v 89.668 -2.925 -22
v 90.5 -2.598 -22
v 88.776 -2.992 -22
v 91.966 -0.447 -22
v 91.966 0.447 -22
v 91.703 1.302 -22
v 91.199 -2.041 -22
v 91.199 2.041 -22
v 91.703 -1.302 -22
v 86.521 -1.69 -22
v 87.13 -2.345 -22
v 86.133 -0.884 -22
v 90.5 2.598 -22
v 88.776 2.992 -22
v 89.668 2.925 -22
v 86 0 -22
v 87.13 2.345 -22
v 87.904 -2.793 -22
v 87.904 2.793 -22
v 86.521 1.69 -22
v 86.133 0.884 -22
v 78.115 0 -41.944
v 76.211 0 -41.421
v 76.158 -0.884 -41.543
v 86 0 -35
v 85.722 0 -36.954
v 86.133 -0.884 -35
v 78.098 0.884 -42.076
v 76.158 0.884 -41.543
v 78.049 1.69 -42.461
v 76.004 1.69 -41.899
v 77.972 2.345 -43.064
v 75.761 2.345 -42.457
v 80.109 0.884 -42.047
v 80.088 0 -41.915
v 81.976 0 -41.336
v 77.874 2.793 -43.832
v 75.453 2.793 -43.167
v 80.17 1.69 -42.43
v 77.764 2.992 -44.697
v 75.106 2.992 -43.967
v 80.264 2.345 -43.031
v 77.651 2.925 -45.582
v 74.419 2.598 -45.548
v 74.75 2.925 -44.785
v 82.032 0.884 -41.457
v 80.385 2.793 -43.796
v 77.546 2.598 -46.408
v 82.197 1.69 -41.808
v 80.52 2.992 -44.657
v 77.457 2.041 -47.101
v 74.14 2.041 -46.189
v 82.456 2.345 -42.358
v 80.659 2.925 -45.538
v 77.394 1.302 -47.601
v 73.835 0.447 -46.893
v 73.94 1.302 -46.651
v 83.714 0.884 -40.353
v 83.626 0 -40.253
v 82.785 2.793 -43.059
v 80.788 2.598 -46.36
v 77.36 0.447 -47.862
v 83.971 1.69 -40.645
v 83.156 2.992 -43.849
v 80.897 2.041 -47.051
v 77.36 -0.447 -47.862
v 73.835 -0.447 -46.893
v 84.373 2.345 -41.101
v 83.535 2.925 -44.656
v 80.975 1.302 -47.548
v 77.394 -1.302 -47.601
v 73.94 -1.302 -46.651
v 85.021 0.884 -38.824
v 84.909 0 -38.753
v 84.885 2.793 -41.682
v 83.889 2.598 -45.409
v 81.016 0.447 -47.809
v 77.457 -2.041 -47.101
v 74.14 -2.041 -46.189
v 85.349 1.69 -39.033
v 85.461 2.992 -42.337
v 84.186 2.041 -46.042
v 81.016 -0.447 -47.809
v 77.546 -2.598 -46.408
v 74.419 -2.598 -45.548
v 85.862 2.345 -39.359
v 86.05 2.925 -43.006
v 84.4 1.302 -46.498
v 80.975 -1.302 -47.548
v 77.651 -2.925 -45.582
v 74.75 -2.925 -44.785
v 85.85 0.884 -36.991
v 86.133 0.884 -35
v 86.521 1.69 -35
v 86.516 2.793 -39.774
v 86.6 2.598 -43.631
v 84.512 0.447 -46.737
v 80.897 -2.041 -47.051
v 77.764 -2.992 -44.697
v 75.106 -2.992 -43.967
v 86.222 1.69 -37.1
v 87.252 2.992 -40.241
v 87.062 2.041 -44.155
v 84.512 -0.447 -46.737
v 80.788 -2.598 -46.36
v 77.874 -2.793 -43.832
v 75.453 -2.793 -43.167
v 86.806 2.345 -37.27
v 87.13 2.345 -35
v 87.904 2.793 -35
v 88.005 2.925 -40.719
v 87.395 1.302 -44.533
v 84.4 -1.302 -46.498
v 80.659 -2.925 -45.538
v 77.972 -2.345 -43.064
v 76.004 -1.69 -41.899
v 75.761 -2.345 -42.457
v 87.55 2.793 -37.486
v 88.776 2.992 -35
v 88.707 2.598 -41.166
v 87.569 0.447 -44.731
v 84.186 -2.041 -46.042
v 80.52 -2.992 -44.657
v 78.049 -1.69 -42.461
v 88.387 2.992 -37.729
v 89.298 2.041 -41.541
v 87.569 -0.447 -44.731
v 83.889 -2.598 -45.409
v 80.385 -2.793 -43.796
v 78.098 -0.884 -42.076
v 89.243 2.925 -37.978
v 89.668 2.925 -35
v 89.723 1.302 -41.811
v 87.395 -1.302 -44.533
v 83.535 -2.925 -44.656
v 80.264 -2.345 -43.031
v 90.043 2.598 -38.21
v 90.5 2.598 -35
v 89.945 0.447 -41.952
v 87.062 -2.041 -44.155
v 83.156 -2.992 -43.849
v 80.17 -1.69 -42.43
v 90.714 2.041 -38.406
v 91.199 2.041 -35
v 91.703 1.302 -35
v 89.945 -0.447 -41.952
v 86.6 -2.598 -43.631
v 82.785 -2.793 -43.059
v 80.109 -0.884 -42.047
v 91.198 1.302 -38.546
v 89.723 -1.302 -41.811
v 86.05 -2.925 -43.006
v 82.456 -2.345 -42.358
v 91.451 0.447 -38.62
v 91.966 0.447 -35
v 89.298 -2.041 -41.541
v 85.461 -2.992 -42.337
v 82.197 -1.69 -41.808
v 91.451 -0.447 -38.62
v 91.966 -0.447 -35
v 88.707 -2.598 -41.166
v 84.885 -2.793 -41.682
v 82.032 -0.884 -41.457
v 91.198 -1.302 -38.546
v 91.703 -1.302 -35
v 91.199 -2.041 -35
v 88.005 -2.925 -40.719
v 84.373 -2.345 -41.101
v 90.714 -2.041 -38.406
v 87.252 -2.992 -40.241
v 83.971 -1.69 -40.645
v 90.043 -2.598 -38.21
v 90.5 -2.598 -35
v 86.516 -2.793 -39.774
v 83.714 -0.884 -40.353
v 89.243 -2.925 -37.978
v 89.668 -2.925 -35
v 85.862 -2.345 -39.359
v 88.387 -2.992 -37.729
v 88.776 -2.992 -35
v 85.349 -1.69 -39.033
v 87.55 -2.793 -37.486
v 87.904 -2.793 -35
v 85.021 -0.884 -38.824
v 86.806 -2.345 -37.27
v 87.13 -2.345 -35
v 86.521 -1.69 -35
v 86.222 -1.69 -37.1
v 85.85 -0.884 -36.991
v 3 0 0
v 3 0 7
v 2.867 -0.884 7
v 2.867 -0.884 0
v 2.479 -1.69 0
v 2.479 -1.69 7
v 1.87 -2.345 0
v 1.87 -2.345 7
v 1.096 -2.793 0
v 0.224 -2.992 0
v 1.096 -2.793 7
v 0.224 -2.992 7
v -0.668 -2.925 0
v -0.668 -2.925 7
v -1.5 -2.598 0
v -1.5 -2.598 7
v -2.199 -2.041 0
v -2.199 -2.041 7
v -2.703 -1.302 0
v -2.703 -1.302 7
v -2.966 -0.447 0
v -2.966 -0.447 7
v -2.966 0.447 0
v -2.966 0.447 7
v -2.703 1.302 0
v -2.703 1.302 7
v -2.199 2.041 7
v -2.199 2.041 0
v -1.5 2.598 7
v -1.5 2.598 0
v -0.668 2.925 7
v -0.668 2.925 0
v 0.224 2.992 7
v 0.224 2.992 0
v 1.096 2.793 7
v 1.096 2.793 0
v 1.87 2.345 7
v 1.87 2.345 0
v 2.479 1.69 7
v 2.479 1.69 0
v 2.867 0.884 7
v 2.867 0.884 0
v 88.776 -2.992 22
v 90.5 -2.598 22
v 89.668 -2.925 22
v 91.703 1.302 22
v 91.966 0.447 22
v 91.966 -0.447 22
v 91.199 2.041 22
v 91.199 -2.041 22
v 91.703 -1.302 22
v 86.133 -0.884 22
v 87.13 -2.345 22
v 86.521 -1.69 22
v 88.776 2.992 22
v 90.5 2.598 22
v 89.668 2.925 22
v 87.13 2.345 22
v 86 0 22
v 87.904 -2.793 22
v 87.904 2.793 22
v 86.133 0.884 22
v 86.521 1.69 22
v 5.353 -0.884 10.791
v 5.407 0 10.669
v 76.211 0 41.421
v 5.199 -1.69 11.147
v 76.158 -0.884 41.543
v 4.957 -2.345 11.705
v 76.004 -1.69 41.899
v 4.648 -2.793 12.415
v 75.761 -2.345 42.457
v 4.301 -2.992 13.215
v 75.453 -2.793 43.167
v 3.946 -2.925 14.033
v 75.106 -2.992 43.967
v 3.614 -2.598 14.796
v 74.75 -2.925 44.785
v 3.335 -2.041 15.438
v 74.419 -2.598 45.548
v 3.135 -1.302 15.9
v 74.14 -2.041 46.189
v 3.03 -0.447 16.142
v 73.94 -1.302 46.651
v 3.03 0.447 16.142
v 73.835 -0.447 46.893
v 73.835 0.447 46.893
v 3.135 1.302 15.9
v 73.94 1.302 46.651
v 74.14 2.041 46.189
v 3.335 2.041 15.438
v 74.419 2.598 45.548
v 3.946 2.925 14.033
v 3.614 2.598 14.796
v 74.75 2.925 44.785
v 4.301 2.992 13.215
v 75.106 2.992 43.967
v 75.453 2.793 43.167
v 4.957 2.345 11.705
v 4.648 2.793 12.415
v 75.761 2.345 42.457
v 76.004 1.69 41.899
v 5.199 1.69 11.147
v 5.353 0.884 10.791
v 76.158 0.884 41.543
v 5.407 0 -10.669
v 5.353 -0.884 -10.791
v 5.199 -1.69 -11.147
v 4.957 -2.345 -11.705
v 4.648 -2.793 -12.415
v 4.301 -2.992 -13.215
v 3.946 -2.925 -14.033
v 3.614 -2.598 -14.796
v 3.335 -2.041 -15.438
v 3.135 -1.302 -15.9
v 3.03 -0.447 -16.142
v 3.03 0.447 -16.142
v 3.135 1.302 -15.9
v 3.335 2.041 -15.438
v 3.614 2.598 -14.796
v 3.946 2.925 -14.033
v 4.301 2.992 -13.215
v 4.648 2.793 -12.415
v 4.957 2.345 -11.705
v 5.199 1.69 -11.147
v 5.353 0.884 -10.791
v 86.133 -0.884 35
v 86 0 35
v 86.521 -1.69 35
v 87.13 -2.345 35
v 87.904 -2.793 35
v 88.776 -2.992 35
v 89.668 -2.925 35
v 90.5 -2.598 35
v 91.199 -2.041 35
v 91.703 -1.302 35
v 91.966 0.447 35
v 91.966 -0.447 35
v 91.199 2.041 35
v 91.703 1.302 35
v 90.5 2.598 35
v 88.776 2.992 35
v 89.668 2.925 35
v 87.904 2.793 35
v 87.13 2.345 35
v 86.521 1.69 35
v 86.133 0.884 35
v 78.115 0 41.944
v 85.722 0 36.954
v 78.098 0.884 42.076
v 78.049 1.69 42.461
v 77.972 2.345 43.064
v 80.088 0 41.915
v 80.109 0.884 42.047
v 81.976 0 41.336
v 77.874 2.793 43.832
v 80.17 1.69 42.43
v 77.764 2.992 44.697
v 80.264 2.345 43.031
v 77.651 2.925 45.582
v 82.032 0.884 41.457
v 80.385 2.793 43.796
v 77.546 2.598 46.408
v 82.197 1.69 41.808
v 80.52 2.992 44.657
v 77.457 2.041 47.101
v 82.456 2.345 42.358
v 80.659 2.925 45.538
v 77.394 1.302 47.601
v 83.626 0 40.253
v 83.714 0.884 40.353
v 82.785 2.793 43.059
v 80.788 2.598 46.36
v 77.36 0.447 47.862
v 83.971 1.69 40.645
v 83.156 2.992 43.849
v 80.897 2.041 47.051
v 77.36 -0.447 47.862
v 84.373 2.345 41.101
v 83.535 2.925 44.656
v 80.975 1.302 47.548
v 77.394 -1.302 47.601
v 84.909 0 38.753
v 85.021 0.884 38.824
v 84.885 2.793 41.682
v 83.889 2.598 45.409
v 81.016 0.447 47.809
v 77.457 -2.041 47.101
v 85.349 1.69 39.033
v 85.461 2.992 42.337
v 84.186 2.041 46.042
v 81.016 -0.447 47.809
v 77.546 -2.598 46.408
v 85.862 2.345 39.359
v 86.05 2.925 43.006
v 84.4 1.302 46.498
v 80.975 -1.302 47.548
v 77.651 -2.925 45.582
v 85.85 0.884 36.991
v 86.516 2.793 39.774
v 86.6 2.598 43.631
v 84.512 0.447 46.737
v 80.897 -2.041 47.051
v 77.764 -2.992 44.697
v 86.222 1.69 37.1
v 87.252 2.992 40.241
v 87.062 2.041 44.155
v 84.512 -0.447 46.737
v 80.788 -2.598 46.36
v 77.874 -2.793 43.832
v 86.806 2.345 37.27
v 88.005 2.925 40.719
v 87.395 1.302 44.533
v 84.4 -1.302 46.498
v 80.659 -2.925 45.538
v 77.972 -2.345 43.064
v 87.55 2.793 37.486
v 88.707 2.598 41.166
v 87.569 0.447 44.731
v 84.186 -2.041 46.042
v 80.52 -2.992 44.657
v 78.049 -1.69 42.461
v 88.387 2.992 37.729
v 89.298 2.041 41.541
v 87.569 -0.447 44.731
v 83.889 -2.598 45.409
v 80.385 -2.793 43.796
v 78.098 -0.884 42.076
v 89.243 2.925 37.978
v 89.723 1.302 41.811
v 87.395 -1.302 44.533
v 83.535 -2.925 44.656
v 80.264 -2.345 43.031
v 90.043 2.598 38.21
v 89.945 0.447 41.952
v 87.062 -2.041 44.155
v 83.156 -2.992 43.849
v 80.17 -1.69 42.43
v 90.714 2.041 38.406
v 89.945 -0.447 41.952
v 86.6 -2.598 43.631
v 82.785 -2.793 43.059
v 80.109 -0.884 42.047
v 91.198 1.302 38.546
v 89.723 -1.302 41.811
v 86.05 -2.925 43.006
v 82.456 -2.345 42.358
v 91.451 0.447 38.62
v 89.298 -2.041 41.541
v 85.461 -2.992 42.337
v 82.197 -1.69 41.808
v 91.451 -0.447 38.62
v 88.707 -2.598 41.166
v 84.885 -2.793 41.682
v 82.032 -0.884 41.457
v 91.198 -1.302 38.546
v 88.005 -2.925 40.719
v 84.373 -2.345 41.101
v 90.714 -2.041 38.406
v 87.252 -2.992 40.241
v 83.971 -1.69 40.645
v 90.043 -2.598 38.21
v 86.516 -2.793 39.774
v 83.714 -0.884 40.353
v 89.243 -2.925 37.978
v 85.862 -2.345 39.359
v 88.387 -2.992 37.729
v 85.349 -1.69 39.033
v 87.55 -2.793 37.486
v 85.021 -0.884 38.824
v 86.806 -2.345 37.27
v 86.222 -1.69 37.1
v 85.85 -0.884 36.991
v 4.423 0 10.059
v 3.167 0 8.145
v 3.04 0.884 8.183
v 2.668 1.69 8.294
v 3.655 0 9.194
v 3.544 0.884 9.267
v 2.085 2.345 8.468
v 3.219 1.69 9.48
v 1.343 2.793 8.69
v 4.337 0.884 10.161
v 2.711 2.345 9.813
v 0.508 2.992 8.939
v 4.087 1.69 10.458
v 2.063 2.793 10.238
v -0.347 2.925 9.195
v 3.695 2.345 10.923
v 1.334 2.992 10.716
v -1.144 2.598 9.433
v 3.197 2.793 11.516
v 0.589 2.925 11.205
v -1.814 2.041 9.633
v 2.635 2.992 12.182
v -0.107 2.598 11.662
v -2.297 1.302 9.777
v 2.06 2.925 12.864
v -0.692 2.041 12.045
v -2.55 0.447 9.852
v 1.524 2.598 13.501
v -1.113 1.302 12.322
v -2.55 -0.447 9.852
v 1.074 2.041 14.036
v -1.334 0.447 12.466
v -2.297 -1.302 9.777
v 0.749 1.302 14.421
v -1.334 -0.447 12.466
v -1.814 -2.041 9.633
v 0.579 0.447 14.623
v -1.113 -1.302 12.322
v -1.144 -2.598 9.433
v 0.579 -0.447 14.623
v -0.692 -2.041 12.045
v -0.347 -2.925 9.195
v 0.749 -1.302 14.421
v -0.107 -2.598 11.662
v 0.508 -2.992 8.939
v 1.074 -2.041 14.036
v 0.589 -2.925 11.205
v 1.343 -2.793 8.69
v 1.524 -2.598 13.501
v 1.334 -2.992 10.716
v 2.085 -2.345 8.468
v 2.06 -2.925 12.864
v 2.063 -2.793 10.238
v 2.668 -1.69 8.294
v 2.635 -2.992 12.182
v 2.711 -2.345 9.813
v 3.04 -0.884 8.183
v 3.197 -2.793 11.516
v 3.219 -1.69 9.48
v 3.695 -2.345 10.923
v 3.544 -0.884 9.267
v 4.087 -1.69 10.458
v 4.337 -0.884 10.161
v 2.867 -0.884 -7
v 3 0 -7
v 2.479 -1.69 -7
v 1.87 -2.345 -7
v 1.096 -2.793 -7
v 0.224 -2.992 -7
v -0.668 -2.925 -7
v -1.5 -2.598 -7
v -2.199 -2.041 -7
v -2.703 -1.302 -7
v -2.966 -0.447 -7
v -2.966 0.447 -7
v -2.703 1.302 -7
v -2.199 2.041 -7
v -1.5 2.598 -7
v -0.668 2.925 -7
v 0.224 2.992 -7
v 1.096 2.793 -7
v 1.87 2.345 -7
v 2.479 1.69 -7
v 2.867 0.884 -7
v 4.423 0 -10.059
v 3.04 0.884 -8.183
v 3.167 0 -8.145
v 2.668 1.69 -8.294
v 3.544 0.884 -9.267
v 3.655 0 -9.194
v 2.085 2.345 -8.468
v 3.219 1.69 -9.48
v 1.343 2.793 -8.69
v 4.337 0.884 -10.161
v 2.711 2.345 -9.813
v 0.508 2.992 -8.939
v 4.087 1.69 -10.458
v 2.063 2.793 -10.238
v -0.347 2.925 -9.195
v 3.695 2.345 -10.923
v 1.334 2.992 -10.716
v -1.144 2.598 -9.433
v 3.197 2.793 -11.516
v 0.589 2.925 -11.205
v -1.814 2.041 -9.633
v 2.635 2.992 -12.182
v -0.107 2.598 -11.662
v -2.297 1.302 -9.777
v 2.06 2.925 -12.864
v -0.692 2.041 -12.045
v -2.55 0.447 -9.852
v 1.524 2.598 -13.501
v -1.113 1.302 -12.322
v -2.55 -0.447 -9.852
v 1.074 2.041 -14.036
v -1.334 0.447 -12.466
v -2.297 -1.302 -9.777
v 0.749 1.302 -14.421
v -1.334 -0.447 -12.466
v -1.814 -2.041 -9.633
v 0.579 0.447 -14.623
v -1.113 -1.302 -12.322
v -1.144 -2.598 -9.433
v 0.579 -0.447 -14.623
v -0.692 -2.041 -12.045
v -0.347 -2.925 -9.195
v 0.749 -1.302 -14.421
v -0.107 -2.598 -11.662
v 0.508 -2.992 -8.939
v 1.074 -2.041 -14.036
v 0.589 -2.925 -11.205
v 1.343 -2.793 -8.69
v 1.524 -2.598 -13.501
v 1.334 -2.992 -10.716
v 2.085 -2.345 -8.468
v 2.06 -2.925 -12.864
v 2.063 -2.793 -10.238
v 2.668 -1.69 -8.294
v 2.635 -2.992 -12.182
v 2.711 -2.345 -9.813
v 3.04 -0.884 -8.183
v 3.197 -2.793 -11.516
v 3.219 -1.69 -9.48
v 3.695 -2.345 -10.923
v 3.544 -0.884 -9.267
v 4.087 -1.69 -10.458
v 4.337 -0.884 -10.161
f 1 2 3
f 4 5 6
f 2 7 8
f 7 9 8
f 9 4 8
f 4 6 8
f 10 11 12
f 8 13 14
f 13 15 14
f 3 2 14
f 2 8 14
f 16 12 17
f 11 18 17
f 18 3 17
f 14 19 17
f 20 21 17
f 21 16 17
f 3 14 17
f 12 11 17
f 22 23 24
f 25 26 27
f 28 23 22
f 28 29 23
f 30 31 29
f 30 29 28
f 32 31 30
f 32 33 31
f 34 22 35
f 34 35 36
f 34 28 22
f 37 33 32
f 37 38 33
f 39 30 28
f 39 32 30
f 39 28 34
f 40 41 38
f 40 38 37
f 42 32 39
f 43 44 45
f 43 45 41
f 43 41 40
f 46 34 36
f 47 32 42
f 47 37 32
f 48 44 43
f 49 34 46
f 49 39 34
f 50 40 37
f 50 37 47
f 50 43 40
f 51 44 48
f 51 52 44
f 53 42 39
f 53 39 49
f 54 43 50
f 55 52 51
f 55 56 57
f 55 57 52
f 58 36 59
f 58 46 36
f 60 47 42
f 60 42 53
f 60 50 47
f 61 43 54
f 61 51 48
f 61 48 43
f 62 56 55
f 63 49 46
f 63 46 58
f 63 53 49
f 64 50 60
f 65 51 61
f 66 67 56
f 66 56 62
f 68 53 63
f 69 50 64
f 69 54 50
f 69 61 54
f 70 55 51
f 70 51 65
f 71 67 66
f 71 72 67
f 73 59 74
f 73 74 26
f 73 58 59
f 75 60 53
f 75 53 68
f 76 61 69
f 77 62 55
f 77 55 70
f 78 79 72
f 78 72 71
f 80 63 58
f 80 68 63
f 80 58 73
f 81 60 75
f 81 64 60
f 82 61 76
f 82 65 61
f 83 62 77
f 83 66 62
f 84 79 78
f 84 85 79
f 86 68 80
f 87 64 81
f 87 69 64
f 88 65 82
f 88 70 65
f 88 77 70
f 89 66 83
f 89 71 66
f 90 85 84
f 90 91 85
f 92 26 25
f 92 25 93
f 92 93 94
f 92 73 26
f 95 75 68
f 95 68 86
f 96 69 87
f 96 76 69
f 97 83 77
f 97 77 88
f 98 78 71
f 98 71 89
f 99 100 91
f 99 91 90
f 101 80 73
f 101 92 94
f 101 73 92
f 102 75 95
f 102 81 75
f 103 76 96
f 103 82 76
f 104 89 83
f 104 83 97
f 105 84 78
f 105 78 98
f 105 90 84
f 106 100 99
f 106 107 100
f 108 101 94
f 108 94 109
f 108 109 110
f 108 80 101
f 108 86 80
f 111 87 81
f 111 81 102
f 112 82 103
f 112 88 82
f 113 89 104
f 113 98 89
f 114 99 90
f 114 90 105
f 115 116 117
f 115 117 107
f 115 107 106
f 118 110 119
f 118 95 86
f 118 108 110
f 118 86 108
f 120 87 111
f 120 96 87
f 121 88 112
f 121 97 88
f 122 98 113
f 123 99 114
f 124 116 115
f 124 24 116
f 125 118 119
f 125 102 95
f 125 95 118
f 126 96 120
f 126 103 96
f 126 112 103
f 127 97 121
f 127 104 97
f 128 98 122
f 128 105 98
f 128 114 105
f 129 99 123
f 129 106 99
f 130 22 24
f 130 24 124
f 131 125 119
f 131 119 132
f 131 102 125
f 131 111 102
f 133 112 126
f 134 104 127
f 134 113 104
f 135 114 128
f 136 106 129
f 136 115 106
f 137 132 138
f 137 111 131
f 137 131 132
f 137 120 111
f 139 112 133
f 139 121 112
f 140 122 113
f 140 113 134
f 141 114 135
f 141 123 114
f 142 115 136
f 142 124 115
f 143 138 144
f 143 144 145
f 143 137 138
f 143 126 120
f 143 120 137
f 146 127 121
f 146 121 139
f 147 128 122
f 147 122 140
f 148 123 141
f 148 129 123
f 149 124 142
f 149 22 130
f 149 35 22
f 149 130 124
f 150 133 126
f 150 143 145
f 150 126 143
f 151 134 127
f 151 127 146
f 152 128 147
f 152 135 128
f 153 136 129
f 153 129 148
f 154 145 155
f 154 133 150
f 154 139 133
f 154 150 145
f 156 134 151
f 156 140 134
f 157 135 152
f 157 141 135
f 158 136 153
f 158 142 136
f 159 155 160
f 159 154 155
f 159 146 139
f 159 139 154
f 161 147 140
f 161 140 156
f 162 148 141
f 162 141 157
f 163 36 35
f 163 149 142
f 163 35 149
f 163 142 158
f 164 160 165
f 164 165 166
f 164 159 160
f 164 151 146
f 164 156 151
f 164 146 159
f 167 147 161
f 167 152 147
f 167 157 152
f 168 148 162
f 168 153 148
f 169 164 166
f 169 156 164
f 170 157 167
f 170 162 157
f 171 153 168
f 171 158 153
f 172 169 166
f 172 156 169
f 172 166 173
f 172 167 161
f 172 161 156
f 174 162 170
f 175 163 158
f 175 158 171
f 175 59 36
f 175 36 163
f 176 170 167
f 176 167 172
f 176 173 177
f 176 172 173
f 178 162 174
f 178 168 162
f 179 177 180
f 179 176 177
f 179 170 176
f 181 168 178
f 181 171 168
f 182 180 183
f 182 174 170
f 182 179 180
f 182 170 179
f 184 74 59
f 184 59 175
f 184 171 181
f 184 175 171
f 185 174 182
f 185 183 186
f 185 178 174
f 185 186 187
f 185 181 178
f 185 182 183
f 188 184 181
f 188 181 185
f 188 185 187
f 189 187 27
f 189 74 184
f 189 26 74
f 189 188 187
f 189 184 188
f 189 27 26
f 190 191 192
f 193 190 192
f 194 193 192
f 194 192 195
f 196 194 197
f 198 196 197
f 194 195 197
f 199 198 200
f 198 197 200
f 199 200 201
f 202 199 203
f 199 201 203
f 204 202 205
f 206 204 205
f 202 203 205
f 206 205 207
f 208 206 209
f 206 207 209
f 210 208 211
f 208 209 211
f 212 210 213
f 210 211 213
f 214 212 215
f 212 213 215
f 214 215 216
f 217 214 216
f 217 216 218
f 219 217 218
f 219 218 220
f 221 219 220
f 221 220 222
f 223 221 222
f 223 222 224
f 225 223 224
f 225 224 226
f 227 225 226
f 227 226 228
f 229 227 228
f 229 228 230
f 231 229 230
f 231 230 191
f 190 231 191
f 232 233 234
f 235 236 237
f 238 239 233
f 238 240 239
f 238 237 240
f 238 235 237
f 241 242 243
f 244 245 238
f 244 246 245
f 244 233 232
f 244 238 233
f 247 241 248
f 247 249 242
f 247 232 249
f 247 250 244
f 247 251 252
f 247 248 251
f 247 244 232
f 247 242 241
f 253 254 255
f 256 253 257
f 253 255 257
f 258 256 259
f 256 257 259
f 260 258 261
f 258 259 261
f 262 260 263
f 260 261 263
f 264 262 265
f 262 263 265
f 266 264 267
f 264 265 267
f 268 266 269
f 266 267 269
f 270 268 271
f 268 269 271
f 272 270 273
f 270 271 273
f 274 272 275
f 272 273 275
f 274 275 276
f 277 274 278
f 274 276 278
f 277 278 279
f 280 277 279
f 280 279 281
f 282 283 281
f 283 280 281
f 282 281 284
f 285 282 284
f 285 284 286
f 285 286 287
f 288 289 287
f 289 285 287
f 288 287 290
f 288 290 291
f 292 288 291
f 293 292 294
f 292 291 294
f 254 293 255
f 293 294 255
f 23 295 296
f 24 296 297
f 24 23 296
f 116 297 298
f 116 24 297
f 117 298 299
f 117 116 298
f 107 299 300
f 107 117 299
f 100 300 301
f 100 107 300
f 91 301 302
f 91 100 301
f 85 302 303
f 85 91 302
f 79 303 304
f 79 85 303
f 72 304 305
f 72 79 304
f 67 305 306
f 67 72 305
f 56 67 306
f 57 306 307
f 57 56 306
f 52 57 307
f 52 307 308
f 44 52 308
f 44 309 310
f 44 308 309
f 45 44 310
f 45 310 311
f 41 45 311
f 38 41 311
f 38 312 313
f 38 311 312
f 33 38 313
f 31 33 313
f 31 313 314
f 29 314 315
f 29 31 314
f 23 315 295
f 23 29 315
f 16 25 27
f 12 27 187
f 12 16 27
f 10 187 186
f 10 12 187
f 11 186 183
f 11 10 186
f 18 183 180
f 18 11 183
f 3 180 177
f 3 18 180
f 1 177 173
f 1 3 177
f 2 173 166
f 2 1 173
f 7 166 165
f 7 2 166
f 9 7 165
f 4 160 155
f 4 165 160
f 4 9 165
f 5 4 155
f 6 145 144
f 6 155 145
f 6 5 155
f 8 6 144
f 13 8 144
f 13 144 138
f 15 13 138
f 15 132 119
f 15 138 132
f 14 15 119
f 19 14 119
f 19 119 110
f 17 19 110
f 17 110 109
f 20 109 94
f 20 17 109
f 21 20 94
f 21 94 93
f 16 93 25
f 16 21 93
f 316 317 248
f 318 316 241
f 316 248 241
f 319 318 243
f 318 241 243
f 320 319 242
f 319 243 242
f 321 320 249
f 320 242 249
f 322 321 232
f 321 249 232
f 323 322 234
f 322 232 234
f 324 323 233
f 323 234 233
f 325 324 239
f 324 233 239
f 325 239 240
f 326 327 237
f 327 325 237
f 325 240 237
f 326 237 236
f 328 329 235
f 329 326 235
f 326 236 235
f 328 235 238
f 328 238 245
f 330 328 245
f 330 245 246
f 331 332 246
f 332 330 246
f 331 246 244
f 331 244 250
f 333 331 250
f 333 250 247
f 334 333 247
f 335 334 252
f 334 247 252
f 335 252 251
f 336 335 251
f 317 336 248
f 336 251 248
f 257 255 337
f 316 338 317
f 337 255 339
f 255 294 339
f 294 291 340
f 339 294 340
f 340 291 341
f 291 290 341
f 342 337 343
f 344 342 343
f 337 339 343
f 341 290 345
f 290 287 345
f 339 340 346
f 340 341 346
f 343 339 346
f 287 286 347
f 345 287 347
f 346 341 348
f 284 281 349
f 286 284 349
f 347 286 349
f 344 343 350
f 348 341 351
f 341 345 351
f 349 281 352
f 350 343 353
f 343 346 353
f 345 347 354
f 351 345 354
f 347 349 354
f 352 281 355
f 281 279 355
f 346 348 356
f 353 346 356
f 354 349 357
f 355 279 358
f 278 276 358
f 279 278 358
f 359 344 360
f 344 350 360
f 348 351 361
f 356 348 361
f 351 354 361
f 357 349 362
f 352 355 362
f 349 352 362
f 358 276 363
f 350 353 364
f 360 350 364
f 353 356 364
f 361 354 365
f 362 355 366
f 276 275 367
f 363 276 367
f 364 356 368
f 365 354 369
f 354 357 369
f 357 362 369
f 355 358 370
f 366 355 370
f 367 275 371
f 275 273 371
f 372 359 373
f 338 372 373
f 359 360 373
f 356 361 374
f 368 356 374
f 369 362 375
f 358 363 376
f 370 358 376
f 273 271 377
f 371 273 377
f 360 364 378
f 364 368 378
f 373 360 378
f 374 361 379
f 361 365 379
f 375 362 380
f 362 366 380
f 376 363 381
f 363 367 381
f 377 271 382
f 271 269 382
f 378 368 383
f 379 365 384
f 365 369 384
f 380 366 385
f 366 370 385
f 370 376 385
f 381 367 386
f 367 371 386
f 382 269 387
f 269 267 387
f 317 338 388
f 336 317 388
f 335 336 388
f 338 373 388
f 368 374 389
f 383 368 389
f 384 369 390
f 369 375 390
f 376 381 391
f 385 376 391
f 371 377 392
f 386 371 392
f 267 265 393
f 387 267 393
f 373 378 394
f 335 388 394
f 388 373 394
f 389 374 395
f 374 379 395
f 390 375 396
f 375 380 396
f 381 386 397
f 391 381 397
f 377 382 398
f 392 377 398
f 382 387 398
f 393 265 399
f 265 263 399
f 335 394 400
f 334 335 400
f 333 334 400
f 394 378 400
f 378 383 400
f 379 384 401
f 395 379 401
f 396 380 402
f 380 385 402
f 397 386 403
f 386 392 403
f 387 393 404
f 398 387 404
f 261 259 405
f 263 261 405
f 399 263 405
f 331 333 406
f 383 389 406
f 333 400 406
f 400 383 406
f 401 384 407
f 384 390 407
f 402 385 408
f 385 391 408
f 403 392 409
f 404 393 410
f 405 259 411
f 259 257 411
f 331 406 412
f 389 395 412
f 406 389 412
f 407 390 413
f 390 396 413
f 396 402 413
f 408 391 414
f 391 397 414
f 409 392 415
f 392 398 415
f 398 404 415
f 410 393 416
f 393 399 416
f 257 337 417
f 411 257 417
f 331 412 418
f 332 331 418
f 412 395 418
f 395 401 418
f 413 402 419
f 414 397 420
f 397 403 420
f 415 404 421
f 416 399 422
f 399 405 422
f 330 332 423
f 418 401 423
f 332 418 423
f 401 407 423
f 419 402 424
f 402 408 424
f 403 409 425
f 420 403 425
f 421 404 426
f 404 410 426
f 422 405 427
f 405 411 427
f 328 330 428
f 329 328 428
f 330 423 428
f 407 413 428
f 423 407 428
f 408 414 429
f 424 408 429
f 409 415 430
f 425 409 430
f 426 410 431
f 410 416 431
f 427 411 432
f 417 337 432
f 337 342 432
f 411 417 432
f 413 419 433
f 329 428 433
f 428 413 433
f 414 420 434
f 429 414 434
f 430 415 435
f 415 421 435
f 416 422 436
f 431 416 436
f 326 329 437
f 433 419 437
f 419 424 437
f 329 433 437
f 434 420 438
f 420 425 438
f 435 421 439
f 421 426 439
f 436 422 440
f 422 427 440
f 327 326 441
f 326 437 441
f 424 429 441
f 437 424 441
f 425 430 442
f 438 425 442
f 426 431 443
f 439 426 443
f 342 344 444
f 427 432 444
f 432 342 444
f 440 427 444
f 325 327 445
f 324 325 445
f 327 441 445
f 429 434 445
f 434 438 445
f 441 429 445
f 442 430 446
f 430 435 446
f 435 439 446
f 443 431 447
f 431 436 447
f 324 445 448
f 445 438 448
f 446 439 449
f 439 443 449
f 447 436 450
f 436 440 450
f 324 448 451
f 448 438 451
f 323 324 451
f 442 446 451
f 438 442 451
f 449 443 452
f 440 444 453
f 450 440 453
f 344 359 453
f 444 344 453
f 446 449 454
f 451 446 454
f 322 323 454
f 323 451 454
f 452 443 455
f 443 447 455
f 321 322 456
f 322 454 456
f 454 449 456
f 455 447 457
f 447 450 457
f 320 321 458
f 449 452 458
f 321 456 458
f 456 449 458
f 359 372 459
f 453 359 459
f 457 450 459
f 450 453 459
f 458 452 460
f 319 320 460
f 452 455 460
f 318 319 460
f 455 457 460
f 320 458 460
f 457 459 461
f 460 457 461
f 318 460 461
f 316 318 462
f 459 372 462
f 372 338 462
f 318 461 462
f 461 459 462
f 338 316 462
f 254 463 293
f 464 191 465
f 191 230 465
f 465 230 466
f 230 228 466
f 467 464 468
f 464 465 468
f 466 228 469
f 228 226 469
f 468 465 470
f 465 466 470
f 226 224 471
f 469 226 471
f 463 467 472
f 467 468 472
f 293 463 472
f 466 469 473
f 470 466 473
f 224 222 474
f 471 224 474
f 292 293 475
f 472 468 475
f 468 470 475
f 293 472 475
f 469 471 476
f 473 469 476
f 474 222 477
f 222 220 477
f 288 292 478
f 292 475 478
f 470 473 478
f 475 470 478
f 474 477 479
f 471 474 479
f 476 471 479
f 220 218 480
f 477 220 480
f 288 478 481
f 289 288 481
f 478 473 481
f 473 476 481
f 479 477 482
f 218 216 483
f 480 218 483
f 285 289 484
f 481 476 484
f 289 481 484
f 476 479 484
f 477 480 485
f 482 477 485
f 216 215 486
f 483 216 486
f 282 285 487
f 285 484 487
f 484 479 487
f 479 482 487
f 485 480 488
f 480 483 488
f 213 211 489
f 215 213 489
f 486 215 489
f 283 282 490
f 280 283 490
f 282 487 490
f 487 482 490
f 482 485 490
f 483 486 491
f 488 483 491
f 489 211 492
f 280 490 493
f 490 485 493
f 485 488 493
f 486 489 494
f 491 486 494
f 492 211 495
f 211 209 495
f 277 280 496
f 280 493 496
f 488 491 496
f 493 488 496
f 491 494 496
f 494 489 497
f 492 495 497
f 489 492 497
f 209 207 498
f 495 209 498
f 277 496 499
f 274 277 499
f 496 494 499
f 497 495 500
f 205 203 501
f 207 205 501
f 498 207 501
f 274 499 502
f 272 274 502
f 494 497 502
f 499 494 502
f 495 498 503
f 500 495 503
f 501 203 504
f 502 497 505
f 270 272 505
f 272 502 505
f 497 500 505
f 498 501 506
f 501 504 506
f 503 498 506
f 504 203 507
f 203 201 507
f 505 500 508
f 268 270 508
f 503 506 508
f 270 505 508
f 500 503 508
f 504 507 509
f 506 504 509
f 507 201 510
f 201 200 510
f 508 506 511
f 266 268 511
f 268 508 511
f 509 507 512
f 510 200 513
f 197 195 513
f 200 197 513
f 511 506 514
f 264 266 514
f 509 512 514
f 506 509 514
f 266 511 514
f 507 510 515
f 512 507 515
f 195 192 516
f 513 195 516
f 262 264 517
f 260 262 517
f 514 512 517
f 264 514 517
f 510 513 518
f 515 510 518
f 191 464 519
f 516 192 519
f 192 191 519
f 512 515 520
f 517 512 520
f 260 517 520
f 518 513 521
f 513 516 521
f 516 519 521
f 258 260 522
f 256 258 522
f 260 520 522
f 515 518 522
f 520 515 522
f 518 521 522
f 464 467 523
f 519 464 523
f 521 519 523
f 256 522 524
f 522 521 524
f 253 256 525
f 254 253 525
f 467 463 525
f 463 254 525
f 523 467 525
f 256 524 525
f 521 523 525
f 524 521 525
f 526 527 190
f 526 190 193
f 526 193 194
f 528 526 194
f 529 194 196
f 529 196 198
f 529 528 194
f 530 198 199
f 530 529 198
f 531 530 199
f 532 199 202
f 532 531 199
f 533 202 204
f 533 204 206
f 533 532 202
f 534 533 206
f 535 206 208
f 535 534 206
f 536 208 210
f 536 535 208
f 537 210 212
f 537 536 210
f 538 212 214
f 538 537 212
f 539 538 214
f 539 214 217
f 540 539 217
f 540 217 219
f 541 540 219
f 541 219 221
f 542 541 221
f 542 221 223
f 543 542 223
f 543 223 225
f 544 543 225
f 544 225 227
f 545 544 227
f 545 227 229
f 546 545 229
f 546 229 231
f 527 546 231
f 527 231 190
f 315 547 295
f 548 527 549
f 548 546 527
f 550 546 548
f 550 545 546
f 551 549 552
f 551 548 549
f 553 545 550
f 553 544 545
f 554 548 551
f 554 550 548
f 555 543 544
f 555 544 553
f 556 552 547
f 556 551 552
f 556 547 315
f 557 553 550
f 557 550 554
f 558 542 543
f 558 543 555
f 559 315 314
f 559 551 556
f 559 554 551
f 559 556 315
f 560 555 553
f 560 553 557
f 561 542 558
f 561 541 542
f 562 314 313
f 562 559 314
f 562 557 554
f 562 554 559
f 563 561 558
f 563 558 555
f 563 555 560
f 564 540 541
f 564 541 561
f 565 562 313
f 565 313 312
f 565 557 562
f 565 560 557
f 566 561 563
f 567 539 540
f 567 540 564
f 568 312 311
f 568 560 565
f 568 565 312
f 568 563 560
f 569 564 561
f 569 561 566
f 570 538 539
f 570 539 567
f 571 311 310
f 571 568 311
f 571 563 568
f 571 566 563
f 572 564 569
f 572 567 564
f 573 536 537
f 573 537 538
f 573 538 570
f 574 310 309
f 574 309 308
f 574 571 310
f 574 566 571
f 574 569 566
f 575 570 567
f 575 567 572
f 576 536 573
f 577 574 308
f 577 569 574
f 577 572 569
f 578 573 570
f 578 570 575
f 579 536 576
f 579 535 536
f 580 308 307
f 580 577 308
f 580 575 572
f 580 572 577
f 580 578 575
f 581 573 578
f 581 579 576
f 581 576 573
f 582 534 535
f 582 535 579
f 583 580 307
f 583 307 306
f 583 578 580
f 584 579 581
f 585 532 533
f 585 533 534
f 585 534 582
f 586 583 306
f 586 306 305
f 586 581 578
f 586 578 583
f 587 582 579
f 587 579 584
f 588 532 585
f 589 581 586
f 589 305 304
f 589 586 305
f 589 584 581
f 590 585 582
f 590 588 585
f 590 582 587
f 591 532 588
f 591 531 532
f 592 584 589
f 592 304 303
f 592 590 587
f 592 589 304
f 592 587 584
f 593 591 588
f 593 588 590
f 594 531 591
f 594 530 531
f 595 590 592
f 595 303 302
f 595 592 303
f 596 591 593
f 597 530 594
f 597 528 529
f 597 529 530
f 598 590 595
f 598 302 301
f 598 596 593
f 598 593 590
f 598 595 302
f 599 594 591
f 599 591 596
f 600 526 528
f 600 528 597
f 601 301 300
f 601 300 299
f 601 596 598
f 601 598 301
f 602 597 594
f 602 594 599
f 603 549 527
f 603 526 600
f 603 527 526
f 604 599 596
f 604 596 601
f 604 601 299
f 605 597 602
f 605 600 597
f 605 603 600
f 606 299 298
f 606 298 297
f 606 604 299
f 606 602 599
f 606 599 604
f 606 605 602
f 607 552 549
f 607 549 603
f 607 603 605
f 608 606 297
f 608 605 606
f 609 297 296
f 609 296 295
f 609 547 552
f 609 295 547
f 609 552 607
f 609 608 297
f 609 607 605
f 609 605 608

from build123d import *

# Parameters (mm, degrees)
CROQUIS2_R = 3


with BuildPart() as part:
    # Barrer1: sweep along a path in Croquis1
    with BuildLine(Plane(origin=(0, 0, 0), x_dir=(1, 0, 0), z_dir=(0, 1, 0))) as barrer1_path:
        Line((0, 0), (0, 7))
        ThreePointArc((0, 7), (1.146798787, 10.839275396), (4.211438733, 13.420586115))
        Line((4.211438733, 13.420586115), (75.016341047, 44.172265879))
        ThreePointArc((75.016341047, 44.172265879), (84.484679137, 43.361716018), (89, 35))
        Line((89, 35), (89, 22))
    # Croquis2 → Barrer1 (sweep)
    with BuildSketch(Plane.XY):
        Circle(CROQUIS2_R)
    barrer1 = sweep(path=barrer1_path.line)

    # Simetría1: Barrer1 across plane
    add(barrer1.mirror(Plane.XY))


solid = part.part
